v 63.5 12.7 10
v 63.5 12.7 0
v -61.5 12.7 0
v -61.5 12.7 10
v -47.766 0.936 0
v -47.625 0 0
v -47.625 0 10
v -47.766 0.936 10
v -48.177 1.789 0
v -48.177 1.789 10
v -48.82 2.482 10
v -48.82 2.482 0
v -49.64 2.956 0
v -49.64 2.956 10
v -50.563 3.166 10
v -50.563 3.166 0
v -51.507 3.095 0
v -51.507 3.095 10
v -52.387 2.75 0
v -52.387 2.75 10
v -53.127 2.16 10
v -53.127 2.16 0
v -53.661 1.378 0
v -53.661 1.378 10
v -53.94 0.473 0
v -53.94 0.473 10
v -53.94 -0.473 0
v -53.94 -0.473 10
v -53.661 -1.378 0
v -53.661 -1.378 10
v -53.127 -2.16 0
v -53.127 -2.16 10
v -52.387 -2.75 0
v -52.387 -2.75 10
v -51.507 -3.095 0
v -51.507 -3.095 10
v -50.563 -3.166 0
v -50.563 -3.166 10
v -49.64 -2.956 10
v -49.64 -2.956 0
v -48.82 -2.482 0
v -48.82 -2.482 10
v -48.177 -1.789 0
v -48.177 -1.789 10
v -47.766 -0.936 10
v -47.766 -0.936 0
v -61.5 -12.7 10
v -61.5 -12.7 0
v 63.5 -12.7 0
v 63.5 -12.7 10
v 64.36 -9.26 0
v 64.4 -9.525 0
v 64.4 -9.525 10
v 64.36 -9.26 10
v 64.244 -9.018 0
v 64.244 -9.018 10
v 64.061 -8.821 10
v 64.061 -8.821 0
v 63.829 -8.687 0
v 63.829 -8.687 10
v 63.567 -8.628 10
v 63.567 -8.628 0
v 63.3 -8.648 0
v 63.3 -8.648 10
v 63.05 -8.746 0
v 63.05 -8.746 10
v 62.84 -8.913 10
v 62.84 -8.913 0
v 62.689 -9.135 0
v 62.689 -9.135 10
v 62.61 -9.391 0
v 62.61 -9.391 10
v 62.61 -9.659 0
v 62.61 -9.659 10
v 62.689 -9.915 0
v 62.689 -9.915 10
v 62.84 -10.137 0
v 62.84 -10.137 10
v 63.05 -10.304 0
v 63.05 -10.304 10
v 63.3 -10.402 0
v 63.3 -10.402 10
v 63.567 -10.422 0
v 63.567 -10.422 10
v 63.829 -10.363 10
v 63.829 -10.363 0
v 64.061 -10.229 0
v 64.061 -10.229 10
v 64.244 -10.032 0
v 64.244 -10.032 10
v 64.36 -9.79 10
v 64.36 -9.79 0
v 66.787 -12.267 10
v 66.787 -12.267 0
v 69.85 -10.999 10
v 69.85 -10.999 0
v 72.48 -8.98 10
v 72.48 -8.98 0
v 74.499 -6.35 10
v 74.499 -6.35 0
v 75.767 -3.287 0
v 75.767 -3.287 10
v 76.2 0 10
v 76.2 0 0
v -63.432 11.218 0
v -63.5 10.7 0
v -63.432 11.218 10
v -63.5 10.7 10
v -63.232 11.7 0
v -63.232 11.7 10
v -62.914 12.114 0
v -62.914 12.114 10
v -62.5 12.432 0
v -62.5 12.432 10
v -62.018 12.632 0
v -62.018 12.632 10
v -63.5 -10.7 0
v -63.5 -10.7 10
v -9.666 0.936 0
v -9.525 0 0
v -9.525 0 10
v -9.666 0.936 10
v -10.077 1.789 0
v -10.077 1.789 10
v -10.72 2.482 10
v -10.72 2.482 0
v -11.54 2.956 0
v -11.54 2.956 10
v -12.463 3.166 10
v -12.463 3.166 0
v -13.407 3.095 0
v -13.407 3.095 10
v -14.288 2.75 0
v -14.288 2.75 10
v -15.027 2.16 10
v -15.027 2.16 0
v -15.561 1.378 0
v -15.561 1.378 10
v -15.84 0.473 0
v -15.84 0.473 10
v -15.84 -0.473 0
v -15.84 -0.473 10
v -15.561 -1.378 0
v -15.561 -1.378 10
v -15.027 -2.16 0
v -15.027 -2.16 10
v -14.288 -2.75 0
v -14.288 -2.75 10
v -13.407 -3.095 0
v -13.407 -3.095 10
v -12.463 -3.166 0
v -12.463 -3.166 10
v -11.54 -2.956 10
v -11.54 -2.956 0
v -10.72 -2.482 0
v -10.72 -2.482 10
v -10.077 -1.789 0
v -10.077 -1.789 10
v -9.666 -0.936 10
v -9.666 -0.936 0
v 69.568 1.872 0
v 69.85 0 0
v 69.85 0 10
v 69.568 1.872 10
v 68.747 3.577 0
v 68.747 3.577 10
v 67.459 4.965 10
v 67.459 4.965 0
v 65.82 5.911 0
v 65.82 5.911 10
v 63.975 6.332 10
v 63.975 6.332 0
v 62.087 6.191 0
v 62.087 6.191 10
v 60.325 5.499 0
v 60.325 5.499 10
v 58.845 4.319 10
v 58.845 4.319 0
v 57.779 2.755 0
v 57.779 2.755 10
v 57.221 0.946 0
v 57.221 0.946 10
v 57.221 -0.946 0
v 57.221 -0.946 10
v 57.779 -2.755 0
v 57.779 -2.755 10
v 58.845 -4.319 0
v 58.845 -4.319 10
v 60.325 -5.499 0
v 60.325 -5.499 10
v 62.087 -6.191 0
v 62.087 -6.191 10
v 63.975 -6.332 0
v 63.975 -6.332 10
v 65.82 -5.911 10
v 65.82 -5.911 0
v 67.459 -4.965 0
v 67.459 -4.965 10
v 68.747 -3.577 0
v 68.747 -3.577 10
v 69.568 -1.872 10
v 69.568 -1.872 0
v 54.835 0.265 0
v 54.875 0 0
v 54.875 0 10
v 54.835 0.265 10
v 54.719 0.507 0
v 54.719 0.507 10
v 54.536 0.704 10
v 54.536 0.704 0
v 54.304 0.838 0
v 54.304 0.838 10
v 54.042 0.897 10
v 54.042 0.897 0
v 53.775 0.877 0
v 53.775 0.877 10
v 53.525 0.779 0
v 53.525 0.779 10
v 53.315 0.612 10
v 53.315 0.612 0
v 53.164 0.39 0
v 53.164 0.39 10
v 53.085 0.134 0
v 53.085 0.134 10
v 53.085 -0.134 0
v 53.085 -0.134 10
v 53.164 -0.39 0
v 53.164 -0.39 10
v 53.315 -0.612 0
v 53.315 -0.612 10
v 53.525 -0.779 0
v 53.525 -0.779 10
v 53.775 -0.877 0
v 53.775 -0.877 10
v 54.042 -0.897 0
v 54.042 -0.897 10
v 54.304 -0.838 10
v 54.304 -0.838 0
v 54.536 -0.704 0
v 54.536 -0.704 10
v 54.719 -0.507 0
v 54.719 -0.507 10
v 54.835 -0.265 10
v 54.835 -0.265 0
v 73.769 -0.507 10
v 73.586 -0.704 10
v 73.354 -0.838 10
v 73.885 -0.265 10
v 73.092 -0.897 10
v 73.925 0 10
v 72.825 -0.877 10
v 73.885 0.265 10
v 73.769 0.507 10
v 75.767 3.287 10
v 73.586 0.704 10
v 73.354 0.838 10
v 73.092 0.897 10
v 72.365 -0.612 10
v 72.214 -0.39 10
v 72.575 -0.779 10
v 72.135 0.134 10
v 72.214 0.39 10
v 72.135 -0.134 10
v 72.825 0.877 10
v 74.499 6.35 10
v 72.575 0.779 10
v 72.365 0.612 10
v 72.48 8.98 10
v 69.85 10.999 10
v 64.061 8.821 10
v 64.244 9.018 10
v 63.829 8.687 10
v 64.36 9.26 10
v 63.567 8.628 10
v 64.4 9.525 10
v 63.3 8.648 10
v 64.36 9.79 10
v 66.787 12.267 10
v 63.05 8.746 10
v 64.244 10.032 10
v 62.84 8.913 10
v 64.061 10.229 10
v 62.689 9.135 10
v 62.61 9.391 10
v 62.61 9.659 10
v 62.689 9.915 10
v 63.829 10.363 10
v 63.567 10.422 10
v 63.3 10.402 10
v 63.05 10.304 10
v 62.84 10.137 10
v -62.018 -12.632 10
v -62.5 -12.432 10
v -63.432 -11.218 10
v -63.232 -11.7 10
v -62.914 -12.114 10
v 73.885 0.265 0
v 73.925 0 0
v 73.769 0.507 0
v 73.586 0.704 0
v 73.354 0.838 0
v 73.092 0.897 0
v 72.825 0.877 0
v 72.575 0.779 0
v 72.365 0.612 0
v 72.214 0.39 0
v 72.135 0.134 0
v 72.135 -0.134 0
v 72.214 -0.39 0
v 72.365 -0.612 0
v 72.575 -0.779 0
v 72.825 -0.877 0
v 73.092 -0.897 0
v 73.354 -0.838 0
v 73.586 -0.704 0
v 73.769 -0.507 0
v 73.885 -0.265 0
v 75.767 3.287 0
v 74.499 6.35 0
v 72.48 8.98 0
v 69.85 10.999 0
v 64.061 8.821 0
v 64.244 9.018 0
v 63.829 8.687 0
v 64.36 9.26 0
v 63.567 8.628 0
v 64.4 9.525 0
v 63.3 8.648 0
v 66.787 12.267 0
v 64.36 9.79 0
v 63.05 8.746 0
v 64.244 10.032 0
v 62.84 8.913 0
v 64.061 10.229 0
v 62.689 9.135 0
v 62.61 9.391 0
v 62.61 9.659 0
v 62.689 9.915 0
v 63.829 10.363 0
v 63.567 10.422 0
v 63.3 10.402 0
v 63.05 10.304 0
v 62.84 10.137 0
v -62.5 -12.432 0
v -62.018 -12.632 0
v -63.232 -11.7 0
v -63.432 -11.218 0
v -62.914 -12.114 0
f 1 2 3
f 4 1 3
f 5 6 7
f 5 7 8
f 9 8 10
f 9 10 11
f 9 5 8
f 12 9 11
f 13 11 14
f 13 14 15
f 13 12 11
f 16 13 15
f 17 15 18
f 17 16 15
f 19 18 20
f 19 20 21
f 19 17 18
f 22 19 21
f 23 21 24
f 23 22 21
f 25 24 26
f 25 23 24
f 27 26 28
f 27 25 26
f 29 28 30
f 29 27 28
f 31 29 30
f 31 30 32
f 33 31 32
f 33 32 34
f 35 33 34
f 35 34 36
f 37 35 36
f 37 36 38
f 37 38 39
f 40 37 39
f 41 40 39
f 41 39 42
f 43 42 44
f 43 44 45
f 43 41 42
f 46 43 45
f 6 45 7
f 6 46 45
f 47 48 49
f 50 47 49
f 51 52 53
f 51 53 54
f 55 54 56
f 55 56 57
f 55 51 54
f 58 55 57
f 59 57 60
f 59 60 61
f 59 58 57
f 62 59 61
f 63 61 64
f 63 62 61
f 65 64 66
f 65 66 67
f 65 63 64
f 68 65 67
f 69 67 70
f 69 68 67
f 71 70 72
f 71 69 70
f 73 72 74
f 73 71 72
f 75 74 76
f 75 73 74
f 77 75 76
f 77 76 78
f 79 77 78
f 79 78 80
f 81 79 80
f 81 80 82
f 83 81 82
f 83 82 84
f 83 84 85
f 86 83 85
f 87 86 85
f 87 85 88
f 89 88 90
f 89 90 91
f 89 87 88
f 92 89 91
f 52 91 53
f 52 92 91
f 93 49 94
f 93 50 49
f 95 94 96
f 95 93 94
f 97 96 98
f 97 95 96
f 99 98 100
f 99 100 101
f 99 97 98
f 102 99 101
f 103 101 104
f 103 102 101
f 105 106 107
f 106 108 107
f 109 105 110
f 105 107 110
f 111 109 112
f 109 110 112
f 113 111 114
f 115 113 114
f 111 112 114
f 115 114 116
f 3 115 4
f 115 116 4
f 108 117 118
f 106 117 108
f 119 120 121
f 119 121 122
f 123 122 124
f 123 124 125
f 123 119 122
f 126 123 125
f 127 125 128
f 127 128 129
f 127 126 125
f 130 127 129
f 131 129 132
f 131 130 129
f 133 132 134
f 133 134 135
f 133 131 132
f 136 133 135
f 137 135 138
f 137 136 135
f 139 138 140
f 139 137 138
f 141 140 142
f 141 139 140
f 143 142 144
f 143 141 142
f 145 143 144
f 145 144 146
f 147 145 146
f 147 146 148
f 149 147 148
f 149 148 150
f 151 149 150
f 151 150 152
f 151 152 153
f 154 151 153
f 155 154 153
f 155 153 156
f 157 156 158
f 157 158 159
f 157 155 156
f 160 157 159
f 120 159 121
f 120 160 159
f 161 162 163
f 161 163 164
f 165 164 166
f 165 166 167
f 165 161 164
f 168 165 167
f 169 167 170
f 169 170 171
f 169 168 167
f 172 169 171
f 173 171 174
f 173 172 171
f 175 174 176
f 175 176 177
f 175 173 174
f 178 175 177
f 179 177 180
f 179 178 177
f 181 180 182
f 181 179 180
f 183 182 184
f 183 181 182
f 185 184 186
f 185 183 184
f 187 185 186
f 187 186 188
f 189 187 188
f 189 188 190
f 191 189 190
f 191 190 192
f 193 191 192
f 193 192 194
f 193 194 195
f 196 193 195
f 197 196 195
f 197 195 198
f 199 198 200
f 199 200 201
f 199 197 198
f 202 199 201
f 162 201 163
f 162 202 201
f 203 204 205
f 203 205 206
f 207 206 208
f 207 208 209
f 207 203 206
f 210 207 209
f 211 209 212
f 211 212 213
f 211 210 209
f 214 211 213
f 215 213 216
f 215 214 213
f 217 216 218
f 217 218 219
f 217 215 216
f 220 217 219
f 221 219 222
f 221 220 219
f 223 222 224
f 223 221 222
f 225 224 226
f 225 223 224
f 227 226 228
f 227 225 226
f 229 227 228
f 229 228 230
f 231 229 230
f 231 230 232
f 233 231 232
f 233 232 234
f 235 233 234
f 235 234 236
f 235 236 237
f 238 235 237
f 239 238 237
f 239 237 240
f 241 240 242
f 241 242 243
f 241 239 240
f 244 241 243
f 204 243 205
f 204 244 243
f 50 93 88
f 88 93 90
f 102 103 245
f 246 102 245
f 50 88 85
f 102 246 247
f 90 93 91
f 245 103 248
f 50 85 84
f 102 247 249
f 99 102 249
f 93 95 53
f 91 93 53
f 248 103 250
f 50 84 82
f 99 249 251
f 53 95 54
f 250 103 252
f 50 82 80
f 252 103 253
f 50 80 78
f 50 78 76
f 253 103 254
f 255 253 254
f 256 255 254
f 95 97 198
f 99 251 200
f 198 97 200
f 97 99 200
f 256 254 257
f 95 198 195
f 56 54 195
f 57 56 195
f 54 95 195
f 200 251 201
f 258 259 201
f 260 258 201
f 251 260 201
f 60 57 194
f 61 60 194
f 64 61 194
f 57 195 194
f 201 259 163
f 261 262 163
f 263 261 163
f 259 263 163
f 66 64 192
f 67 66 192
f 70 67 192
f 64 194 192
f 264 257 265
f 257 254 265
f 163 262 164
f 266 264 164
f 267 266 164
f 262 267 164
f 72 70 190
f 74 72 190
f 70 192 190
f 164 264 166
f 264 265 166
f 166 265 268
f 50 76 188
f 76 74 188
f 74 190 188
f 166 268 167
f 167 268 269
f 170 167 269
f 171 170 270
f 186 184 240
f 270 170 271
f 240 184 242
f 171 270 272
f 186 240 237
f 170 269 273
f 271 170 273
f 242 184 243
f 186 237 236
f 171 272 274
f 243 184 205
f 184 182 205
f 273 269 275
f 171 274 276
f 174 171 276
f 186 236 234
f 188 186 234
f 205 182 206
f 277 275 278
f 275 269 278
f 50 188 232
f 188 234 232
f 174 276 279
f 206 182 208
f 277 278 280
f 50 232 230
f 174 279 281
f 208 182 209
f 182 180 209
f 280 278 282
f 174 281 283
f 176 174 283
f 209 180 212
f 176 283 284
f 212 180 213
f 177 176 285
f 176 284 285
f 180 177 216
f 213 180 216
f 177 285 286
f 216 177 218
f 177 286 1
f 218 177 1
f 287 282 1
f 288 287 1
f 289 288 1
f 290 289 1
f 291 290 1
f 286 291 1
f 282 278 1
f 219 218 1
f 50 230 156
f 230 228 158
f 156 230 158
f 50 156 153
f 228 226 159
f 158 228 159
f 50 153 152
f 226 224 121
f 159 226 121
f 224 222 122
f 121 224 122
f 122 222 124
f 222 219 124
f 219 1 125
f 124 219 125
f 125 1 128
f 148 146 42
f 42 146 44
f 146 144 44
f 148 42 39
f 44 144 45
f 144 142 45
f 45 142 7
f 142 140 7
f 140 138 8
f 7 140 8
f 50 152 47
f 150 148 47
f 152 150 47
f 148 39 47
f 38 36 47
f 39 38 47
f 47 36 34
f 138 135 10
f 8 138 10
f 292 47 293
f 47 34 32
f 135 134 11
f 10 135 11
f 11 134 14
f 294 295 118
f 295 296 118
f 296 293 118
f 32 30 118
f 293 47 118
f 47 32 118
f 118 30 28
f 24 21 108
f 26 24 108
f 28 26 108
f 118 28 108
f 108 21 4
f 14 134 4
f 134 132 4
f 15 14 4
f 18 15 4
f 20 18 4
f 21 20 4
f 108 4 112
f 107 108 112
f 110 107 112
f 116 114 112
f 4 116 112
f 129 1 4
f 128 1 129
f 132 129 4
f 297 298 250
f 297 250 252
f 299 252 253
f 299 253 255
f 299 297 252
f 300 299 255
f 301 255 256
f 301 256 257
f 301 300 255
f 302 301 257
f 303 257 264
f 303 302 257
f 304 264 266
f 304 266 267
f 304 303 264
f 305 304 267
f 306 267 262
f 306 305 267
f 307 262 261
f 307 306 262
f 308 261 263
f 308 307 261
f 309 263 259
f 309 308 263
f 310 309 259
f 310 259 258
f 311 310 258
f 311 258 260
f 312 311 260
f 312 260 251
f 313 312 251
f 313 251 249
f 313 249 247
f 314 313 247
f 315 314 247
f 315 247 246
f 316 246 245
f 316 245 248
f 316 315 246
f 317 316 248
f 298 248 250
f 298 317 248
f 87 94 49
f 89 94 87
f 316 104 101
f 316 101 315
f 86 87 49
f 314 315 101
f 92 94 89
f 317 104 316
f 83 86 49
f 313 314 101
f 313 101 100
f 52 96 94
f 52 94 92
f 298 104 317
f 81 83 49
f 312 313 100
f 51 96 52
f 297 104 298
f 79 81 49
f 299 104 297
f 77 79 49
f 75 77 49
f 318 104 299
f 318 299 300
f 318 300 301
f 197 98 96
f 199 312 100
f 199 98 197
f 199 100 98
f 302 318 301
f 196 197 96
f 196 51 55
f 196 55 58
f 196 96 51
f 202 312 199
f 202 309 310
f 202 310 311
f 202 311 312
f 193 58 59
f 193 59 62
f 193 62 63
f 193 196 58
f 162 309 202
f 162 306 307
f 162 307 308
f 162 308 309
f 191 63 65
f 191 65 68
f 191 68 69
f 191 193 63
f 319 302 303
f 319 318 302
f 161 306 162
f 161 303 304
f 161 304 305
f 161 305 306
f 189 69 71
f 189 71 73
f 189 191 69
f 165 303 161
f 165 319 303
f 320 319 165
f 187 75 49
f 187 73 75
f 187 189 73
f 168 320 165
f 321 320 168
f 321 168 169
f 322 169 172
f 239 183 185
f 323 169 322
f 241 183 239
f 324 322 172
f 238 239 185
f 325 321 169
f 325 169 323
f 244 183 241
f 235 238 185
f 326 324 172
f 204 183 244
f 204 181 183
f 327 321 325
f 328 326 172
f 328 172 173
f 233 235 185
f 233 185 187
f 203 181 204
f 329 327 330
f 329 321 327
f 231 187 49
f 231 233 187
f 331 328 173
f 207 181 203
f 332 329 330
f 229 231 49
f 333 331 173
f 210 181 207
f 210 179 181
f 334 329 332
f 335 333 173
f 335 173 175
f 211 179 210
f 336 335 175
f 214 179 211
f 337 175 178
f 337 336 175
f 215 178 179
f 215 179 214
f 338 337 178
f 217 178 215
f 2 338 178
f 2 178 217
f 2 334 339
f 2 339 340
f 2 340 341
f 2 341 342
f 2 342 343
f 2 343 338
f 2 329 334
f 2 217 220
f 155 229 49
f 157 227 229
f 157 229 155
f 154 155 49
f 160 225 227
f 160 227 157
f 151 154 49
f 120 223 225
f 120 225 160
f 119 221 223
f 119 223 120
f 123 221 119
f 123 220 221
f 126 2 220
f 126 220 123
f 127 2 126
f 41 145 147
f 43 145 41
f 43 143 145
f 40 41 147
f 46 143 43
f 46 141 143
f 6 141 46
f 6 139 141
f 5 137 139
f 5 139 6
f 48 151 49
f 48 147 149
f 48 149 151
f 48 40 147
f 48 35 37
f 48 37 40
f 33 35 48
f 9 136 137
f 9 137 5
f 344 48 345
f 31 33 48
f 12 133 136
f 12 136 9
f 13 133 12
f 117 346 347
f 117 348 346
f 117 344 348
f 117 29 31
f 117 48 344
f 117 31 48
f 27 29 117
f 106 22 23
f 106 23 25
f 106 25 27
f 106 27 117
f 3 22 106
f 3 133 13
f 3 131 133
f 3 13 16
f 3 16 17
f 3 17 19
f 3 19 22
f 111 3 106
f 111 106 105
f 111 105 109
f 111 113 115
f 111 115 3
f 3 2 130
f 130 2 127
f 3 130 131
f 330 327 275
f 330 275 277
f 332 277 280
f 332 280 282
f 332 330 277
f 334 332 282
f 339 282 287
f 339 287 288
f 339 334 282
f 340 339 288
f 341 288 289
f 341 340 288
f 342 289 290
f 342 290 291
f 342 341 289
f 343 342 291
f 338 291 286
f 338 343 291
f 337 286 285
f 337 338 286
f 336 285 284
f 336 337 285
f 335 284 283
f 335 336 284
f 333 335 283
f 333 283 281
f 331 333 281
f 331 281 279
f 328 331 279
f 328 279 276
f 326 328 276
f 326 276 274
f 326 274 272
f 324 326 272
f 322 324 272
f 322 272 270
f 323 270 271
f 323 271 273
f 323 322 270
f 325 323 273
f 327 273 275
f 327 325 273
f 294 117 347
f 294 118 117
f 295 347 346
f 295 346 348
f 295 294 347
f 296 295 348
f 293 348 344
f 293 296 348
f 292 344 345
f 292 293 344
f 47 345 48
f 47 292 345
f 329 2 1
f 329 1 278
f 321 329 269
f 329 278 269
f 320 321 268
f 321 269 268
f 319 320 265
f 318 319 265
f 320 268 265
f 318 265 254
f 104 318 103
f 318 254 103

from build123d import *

# Parameters (mm, degrees)
SKETCH1_R           = 3.175
SKETCH1_R_2         = 6.35
SKETCH1_R_3         = 0.9
BOSS_EXTRUDE1_DEPTH = 10
FILLET2_R           = 2
FILLET3_R           = 12.7


with BuildPart() as part:
    # Sketch1 → Boss-Extrude1 (new body)
    with BuildSketch(Plane.XY):
        Polygon((-63.5, -12.7), (-63.5, 12.7), (63.5, 12.7), (76.2, 12.7), (76.2, -12.7), (63.5, -12.7), align=None)
        with Locations((-50.8, 0)):
            Circle(SKETCH1_R, mode=Mode.SUBTRACT)
        with Locations((63.5, 0)):
            Circle(SKETCH1_R_2, mode=Mode.SUBTRACT)
        with Locations((63.5, 9.525)):
            Circle(SKETCH1_R_3, mode=Mode.SUBTRACT)
        with Locations((63.5, -9.525)):
            Circle(SKETCH1_R_3, mode=Mode.SUBTRACT)
        with Locations((53.975, 0)):
            Circle(SKETCH1_R_3, mode=Mode.SUBTRACT)
        with Locations((73.025, 0)):
            Circle(SKETCH1_R_3, mode=Mode.SUBTRACT)
        with Locations((-12.7, 0)):
            Circle(SKETCH1_R, mode=Mode.SUBTRACT)
    extrude(amount=BOSS_EXTRUDE1_DEPTH)

    # Fillet2
    fillet2_edges = [part.edges().sort_by_distance(p)[0] for p in [
        (-63.5, -12.7, 5),
        (-63.5, 12.7, 5),
    ]]
    fillet(fillet2_edges, radius=FILLET2_R)

    # Fillet3
    fillet3_edges = [part.edges().sort_by_distance(p)[0] for p in [
        (76.2, 12.7, 5),
        (76.2, -12.7, 5),
    ]]
    fillet(fillet3_edges, radius=FILLET3_R - 0.0001)  # a hair under: the kernel refuses the full size


solid = part.part
